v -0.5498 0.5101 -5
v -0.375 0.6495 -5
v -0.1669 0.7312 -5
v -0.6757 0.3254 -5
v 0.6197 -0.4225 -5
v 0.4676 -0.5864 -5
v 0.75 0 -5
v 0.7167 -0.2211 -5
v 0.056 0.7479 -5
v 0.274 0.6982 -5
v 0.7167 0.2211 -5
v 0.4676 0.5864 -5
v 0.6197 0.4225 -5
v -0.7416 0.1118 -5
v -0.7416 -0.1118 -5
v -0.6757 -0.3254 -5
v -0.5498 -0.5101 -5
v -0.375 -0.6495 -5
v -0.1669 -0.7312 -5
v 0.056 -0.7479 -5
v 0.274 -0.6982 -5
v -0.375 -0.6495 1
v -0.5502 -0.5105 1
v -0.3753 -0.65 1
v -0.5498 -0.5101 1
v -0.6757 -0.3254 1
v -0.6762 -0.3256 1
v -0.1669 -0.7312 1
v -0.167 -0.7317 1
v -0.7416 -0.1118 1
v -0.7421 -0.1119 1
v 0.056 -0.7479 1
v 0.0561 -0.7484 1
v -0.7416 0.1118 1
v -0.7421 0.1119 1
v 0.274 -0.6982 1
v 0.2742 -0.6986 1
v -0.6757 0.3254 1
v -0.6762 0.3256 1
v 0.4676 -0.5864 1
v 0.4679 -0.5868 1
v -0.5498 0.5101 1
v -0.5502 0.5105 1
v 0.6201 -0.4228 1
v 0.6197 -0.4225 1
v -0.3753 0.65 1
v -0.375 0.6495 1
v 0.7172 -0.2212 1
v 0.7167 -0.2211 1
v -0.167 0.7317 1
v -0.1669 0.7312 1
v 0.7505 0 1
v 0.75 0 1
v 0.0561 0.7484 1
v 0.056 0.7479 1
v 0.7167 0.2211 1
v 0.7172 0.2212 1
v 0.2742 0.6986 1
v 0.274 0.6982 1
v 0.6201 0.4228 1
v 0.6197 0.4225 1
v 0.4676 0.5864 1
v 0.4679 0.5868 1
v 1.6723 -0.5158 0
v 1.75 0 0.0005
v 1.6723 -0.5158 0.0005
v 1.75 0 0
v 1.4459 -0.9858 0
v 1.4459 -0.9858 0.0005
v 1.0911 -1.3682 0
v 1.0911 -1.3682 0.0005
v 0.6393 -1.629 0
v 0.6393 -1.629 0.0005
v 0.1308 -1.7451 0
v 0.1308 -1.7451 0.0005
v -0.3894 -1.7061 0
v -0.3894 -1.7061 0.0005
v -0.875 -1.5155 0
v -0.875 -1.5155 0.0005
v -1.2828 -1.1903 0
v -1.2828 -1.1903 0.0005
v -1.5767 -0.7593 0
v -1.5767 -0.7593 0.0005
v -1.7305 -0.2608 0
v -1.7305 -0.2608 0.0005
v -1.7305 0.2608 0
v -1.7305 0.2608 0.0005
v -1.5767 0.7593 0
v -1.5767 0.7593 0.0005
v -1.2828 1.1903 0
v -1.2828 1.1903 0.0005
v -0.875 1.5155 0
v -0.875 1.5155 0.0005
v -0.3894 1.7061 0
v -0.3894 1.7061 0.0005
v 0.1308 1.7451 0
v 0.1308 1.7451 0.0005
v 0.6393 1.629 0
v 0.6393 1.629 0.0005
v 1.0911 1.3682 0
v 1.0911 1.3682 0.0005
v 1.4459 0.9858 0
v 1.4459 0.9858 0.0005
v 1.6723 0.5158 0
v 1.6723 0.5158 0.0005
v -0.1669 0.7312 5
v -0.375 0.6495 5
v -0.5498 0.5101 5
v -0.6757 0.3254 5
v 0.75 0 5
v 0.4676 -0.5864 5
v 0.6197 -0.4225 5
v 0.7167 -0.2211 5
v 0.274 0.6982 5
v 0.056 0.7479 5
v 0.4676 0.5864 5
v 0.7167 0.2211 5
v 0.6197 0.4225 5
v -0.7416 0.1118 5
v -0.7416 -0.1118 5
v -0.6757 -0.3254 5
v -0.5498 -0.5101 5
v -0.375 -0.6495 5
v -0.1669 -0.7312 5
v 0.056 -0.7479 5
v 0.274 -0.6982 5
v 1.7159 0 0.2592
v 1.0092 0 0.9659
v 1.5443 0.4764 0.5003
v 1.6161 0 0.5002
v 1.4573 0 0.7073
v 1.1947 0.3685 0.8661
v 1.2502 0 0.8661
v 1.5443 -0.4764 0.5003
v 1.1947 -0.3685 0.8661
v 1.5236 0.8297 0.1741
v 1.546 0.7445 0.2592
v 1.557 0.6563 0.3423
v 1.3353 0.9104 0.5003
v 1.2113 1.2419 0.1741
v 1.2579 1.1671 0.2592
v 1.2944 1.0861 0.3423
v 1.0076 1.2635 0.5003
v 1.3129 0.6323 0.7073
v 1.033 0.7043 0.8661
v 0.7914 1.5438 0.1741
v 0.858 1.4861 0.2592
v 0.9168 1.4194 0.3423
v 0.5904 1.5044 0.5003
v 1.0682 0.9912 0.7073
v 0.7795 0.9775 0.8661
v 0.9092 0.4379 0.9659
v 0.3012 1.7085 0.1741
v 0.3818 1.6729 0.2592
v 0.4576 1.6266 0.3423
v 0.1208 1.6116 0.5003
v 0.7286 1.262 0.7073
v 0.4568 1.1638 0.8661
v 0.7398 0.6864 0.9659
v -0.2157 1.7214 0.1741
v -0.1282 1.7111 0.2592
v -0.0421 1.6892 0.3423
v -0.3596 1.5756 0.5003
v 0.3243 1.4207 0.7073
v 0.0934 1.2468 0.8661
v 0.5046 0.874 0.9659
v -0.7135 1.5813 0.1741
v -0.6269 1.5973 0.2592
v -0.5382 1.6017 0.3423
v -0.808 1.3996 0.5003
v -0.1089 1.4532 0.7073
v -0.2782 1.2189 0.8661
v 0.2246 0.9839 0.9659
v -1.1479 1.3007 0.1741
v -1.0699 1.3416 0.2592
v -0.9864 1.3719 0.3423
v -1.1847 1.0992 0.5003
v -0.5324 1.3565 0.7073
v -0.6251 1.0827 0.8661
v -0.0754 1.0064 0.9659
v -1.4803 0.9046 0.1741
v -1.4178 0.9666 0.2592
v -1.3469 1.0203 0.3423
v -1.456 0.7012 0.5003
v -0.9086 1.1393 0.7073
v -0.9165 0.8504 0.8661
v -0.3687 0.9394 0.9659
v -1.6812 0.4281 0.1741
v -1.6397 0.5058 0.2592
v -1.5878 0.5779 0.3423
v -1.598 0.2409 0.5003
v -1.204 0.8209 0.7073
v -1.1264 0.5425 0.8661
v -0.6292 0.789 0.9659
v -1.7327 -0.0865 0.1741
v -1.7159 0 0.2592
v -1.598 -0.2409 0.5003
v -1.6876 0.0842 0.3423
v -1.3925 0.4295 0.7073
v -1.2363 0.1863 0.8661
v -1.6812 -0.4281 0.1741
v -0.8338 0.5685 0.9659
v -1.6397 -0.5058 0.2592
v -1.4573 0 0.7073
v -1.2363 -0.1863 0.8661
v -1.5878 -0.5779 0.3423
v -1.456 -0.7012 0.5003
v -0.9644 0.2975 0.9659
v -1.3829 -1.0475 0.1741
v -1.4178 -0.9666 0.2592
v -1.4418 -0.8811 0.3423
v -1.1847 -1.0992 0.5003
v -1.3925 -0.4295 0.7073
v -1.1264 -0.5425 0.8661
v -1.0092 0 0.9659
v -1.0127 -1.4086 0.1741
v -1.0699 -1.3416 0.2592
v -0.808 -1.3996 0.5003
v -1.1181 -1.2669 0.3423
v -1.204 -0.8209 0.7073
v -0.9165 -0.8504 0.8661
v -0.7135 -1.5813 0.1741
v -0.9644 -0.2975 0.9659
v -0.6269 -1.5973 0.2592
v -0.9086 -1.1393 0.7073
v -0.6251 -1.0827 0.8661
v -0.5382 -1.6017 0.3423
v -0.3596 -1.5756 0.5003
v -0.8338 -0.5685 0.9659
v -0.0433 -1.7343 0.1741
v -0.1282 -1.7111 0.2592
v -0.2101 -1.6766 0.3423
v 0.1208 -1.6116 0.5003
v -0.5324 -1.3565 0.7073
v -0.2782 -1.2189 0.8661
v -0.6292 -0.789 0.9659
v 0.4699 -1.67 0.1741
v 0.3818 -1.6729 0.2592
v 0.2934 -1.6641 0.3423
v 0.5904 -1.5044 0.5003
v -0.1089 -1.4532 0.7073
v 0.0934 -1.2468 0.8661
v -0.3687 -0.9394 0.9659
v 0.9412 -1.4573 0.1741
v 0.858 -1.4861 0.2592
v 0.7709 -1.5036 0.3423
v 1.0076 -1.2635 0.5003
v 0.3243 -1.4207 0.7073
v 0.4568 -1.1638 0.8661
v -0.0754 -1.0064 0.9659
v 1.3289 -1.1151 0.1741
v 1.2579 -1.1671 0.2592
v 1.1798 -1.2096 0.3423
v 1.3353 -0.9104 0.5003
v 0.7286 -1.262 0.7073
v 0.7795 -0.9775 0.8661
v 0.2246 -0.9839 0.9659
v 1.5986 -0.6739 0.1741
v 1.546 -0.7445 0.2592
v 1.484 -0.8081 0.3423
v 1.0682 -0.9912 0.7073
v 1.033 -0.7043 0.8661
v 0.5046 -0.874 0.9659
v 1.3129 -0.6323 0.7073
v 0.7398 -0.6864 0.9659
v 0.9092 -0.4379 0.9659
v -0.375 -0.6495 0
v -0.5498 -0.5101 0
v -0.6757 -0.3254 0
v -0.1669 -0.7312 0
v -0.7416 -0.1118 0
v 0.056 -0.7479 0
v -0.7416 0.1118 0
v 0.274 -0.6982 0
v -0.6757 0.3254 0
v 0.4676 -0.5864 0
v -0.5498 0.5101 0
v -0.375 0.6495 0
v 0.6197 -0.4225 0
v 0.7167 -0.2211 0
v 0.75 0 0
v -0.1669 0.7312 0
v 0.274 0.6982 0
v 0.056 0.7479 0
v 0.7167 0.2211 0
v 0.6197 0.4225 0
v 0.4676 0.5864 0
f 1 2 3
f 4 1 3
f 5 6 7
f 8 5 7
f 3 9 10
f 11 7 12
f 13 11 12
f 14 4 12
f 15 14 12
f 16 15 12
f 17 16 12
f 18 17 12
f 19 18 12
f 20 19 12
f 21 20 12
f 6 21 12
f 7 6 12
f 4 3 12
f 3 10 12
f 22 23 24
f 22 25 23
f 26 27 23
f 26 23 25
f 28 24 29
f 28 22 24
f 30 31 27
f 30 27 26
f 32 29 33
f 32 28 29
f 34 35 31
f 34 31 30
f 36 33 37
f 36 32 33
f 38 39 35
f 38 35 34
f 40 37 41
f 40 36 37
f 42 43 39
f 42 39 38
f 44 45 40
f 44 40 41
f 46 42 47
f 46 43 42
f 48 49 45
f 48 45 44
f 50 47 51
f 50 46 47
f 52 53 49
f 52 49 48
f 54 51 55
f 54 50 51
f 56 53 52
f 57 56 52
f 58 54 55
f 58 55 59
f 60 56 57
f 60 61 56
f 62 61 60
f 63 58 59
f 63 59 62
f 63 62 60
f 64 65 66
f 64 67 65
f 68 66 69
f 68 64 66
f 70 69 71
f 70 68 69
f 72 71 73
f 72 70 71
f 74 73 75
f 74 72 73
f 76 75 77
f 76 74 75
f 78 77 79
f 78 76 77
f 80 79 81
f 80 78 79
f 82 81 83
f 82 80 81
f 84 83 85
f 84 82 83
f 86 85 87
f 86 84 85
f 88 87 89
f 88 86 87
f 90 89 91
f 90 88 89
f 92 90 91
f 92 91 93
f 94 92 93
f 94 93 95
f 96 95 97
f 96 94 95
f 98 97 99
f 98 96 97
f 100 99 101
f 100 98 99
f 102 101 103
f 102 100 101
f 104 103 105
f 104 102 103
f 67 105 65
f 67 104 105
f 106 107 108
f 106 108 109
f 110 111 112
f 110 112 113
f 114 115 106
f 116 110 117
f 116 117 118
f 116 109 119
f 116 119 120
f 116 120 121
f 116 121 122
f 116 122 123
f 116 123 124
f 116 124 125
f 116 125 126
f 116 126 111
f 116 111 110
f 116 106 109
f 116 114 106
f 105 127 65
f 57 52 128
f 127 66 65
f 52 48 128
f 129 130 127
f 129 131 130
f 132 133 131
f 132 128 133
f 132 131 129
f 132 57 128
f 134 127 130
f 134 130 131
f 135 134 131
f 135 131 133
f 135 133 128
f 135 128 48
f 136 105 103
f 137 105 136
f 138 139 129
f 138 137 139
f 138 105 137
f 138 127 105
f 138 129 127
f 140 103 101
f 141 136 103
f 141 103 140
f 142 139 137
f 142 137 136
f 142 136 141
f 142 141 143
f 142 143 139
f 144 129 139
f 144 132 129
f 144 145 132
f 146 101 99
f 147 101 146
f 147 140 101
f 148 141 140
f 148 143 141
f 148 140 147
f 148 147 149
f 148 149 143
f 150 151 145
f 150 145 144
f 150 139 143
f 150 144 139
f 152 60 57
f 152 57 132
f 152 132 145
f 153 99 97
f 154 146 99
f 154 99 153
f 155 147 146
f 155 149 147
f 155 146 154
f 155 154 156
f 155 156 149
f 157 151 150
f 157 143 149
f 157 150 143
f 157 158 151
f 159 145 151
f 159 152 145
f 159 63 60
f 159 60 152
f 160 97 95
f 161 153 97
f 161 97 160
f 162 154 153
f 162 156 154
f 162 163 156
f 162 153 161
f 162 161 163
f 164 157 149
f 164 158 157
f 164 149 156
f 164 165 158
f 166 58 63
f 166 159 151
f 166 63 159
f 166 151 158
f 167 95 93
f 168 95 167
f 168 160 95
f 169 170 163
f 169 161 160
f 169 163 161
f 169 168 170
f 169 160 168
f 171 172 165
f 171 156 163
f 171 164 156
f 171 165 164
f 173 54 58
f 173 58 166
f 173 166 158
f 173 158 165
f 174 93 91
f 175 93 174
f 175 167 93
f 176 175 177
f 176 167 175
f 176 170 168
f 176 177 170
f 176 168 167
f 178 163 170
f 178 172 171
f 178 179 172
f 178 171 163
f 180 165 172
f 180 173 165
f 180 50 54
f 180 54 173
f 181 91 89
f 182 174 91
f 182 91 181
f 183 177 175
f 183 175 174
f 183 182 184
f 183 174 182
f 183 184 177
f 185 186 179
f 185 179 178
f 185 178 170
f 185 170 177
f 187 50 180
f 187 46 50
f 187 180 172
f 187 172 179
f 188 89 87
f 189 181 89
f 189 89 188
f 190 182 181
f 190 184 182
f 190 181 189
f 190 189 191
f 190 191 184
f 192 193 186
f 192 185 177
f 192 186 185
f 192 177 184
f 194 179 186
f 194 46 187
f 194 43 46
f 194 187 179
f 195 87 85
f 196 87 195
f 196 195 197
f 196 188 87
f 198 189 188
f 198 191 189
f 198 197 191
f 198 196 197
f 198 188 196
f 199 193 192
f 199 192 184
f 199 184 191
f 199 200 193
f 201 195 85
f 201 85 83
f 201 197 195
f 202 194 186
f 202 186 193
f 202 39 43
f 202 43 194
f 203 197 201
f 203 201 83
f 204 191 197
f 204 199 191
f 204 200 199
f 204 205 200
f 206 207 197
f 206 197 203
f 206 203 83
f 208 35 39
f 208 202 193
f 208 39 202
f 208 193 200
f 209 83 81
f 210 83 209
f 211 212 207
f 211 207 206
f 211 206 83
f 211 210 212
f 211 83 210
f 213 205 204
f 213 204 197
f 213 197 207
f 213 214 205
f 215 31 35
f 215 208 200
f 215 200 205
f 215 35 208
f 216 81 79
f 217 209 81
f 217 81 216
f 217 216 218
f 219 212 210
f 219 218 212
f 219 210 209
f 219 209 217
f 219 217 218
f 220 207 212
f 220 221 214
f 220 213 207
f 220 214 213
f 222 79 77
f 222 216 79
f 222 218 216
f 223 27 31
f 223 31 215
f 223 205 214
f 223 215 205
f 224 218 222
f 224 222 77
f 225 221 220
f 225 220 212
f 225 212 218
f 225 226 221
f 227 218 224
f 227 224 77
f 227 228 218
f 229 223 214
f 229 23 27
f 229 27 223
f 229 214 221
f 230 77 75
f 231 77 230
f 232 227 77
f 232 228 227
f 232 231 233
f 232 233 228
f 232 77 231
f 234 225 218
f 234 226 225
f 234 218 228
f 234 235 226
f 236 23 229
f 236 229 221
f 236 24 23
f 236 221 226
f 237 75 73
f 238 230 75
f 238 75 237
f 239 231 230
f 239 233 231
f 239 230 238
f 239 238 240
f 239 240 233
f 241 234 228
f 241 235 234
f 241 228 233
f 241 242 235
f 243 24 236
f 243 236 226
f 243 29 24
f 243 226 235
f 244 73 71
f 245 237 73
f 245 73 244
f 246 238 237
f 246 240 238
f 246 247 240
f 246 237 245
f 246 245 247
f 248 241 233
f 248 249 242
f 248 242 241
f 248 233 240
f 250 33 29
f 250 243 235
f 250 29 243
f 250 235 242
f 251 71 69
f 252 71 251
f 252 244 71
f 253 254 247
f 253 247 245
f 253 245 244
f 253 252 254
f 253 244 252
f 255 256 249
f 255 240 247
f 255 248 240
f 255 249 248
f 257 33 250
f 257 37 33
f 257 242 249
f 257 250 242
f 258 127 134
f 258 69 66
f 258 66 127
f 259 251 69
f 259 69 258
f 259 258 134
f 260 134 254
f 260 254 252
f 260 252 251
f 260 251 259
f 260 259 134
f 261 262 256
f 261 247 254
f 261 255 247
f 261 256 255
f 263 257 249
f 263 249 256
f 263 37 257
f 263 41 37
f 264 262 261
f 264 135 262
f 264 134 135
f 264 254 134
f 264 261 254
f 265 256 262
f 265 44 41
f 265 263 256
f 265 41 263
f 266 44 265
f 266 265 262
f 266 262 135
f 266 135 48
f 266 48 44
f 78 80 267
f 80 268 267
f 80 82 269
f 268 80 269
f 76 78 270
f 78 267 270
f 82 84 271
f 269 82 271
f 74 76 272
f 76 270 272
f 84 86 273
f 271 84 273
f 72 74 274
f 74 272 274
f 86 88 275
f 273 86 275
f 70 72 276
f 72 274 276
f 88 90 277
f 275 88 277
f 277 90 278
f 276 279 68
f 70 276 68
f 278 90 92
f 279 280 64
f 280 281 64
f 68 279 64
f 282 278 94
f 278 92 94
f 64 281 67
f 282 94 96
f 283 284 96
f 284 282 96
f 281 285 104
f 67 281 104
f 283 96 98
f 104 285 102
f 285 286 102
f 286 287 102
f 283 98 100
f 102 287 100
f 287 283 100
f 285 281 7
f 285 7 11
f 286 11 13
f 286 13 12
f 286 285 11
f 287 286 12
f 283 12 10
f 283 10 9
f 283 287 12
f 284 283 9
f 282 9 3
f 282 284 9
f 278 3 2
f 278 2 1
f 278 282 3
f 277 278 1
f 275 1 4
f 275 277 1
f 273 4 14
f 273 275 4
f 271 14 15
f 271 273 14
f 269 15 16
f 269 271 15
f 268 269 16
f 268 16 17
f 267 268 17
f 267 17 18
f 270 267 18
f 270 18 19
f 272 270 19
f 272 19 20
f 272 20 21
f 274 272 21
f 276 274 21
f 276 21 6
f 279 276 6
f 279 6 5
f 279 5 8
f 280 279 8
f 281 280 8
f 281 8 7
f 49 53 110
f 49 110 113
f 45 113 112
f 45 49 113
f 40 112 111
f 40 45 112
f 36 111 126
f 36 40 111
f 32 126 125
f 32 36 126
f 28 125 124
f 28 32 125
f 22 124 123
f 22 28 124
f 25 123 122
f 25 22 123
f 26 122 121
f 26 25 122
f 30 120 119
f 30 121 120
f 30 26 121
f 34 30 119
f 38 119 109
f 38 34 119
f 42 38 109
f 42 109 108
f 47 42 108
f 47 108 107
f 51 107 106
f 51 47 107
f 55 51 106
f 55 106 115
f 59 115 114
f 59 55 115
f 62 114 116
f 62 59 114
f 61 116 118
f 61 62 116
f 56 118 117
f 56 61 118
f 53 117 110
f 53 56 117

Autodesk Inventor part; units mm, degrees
ref_plane "YZ Plane" through (0, 0, 0) normal (1, 0, 0) x (0, 1, 0)
ref_plane "XZ Plane" through (0, 0, 0) normal (0, 1, 0) x (-1, 0, 0)
ref_plane "XY Plane" through (0, 0, 0) normal (0, 0, 1) x (1, 0, 0)
sketch "Sketch1" plane through (0, 0, 0) normal (0, 0, 1) x (1, 0, 0)
  circle A0 centre (0, 0) radius 0.75
  circle A1 centre (0, 0) radius 1.75
  dimension "d0" = 1.5
  dimension "d1" = 3.5
extrude "Extrusion1" add sketch "Sketch1" along normal mid plane 10 contours A0
extrude "Extrusion2" add sketch "Sketch1" along normal blind 1
fillet "Fillet1" radius 1 1 edges at (-1.75, 0, 1)
properties part number "X-Ray Tube Pins" material "Aluminum 6061"
